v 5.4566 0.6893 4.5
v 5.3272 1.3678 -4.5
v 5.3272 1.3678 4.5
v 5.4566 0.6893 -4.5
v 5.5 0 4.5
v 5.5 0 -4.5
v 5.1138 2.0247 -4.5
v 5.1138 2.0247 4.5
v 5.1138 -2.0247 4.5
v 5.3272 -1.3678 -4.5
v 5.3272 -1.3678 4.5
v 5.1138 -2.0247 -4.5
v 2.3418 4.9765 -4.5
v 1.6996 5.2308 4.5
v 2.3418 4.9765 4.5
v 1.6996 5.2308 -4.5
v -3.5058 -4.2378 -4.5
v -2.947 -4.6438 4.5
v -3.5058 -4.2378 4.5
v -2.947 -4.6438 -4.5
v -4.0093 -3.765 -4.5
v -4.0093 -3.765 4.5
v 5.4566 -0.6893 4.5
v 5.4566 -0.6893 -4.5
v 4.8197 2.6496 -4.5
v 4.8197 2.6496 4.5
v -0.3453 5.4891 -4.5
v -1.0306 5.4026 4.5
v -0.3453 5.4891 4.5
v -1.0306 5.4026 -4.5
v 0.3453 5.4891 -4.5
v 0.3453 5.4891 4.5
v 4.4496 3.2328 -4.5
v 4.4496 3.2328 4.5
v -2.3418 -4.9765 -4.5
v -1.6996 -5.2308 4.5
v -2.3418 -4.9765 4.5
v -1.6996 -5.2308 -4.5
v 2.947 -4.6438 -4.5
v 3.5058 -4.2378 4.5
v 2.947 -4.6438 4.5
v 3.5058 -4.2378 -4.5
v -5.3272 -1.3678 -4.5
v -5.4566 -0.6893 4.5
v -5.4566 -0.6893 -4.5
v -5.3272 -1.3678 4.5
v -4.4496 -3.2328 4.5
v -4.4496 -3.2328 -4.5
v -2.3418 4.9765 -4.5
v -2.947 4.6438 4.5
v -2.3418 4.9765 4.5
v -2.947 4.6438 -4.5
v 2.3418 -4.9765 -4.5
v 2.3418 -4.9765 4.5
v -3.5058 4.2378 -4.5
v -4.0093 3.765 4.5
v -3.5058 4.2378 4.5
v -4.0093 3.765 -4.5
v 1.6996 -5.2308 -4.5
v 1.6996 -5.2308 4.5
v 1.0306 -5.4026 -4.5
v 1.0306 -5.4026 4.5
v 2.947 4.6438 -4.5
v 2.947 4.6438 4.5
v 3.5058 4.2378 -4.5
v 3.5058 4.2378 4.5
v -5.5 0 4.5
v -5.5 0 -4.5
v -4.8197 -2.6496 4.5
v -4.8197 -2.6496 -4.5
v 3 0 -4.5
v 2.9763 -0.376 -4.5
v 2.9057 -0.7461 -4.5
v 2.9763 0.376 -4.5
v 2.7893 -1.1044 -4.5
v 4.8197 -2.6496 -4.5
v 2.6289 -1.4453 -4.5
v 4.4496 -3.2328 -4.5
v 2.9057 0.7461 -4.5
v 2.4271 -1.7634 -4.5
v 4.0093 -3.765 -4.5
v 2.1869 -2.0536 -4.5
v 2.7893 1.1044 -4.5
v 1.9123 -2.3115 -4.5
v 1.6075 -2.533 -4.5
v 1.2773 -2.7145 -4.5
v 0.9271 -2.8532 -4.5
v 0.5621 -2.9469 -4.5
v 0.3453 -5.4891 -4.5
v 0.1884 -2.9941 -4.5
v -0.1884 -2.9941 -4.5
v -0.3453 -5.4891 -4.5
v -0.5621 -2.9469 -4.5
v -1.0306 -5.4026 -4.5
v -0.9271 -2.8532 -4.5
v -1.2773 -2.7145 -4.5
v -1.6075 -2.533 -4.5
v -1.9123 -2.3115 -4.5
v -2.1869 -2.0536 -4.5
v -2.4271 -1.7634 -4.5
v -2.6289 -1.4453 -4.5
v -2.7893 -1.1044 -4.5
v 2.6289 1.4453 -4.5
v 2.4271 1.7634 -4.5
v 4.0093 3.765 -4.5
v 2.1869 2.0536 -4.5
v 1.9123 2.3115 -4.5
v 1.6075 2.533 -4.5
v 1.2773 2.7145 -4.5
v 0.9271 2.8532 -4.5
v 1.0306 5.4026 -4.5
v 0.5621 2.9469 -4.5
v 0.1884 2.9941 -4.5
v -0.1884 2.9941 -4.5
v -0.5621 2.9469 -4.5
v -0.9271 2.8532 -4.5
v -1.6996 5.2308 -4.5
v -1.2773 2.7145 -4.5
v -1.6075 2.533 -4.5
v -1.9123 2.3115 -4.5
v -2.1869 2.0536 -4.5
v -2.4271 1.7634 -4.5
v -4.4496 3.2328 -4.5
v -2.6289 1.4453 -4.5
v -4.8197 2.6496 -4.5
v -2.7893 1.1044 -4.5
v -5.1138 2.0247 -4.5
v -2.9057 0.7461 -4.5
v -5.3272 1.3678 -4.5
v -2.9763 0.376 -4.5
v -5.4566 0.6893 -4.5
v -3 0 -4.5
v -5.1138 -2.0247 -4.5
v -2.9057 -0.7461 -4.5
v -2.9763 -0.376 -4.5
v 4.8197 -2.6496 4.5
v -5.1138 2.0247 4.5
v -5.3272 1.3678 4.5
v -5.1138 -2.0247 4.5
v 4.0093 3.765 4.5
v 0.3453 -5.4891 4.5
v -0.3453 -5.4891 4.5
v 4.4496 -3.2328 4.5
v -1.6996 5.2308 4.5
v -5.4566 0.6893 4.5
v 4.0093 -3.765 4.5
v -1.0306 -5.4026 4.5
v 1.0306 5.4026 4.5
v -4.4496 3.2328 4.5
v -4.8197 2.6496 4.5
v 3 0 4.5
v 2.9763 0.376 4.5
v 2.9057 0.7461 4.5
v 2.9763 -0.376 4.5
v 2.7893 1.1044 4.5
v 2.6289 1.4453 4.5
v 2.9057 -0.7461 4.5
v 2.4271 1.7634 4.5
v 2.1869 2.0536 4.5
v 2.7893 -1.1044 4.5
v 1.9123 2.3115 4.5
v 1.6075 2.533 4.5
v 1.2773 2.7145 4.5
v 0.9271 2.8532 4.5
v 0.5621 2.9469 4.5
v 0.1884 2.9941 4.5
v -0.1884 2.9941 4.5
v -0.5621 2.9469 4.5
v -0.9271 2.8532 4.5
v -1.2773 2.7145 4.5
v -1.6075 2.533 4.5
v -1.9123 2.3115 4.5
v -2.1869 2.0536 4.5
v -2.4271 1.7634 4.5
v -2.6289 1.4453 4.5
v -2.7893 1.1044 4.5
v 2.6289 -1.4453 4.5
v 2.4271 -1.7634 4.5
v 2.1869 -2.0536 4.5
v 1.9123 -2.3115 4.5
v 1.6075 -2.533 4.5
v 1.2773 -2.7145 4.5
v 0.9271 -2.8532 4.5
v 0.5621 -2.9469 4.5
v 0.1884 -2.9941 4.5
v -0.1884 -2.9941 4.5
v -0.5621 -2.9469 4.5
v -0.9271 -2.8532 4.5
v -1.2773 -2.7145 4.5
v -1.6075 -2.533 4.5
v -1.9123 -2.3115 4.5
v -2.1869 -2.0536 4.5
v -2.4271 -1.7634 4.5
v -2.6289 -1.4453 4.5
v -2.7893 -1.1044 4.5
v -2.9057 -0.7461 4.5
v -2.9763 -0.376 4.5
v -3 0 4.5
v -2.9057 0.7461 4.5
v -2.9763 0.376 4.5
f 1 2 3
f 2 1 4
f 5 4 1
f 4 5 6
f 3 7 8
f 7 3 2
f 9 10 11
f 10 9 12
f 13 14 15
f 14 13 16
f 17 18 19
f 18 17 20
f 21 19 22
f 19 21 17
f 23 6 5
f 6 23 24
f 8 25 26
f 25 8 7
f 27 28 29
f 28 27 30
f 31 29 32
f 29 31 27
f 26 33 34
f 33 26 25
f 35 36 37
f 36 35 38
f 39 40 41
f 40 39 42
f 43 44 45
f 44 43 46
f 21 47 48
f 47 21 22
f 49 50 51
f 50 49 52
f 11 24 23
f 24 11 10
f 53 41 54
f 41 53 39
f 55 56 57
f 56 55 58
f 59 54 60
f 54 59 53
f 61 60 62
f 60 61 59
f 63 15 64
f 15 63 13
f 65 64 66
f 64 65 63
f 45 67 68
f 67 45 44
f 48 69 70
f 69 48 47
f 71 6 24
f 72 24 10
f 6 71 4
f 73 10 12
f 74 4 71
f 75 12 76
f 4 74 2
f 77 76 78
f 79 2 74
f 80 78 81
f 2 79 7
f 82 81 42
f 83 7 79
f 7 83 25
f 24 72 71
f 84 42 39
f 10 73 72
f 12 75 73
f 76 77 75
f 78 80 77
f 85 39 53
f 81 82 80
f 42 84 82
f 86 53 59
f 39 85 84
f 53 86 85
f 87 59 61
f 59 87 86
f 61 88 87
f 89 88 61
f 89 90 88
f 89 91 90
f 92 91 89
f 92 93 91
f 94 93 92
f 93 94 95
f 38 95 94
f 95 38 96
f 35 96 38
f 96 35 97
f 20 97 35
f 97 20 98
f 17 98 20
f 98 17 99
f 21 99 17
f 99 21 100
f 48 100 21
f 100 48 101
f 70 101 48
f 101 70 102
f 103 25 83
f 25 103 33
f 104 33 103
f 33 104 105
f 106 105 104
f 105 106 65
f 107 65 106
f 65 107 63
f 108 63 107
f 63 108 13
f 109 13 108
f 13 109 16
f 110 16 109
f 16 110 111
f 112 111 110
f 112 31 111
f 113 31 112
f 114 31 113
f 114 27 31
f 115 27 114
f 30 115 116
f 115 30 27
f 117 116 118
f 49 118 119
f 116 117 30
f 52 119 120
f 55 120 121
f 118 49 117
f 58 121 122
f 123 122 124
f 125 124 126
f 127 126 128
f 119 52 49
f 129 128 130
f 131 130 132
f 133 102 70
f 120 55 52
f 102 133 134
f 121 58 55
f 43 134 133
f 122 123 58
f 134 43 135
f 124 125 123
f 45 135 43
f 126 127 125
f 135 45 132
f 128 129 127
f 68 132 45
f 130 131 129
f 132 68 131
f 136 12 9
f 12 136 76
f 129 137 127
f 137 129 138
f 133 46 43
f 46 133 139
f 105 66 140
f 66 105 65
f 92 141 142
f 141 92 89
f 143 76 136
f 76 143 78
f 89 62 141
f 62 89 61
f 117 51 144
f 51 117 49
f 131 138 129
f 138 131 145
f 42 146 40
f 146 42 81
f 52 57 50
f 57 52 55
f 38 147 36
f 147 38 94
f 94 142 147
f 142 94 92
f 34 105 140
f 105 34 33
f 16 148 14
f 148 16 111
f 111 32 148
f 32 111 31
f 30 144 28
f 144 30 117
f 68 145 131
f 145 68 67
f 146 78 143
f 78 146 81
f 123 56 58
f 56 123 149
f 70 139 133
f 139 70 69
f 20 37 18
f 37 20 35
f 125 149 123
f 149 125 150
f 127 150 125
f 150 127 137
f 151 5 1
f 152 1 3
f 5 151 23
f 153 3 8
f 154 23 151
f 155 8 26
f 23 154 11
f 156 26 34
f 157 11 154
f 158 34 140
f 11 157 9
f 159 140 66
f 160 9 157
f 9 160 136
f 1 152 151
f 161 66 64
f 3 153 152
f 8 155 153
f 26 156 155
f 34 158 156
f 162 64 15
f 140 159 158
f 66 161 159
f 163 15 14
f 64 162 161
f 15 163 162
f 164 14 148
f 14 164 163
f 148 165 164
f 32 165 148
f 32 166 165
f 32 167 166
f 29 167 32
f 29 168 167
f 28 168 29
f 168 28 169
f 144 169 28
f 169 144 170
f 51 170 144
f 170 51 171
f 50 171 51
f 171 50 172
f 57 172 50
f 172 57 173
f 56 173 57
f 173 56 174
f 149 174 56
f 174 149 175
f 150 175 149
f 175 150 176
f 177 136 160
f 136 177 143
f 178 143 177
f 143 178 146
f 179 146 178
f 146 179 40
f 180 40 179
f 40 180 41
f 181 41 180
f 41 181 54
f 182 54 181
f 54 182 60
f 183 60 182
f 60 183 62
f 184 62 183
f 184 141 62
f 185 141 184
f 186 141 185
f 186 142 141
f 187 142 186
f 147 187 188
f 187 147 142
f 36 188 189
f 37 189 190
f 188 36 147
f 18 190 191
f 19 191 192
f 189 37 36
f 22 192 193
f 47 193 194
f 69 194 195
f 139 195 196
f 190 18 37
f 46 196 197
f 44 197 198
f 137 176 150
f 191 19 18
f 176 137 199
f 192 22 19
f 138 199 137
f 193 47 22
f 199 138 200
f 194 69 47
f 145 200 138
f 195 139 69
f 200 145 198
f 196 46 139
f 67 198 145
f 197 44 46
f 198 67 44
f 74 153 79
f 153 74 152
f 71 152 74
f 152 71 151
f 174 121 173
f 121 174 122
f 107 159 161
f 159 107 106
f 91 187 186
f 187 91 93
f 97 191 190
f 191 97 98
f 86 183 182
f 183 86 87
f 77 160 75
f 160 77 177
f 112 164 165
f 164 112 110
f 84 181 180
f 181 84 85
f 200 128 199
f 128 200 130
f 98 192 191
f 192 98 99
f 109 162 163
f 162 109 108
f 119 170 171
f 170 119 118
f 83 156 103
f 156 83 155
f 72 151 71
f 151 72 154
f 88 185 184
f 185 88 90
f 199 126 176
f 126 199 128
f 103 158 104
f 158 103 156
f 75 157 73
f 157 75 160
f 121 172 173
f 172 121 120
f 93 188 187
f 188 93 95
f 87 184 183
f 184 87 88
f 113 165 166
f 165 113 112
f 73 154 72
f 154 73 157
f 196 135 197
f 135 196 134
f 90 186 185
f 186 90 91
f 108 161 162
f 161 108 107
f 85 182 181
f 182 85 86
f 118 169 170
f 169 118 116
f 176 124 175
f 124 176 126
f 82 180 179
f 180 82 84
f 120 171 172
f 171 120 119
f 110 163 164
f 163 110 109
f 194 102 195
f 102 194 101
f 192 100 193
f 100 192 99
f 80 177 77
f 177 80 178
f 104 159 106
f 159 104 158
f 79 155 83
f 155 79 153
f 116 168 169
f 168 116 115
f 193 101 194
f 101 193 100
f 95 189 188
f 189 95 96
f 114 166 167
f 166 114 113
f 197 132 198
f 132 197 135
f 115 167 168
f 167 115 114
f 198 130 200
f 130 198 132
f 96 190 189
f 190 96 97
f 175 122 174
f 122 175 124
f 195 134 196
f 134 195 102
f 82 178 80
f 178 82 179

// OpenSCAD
$fn = 50;


difference() {
	union() {
		translate(v = [0, 0, -4.5000000000]) {
			cylinder(h = 9, r = 5.5000000000);
		}
	}
	union() {
		translate(v = [0, 0, -100.0000000000]) {
			cylinder(h = 200, r = 3.0000000000);
		}
	}
}
